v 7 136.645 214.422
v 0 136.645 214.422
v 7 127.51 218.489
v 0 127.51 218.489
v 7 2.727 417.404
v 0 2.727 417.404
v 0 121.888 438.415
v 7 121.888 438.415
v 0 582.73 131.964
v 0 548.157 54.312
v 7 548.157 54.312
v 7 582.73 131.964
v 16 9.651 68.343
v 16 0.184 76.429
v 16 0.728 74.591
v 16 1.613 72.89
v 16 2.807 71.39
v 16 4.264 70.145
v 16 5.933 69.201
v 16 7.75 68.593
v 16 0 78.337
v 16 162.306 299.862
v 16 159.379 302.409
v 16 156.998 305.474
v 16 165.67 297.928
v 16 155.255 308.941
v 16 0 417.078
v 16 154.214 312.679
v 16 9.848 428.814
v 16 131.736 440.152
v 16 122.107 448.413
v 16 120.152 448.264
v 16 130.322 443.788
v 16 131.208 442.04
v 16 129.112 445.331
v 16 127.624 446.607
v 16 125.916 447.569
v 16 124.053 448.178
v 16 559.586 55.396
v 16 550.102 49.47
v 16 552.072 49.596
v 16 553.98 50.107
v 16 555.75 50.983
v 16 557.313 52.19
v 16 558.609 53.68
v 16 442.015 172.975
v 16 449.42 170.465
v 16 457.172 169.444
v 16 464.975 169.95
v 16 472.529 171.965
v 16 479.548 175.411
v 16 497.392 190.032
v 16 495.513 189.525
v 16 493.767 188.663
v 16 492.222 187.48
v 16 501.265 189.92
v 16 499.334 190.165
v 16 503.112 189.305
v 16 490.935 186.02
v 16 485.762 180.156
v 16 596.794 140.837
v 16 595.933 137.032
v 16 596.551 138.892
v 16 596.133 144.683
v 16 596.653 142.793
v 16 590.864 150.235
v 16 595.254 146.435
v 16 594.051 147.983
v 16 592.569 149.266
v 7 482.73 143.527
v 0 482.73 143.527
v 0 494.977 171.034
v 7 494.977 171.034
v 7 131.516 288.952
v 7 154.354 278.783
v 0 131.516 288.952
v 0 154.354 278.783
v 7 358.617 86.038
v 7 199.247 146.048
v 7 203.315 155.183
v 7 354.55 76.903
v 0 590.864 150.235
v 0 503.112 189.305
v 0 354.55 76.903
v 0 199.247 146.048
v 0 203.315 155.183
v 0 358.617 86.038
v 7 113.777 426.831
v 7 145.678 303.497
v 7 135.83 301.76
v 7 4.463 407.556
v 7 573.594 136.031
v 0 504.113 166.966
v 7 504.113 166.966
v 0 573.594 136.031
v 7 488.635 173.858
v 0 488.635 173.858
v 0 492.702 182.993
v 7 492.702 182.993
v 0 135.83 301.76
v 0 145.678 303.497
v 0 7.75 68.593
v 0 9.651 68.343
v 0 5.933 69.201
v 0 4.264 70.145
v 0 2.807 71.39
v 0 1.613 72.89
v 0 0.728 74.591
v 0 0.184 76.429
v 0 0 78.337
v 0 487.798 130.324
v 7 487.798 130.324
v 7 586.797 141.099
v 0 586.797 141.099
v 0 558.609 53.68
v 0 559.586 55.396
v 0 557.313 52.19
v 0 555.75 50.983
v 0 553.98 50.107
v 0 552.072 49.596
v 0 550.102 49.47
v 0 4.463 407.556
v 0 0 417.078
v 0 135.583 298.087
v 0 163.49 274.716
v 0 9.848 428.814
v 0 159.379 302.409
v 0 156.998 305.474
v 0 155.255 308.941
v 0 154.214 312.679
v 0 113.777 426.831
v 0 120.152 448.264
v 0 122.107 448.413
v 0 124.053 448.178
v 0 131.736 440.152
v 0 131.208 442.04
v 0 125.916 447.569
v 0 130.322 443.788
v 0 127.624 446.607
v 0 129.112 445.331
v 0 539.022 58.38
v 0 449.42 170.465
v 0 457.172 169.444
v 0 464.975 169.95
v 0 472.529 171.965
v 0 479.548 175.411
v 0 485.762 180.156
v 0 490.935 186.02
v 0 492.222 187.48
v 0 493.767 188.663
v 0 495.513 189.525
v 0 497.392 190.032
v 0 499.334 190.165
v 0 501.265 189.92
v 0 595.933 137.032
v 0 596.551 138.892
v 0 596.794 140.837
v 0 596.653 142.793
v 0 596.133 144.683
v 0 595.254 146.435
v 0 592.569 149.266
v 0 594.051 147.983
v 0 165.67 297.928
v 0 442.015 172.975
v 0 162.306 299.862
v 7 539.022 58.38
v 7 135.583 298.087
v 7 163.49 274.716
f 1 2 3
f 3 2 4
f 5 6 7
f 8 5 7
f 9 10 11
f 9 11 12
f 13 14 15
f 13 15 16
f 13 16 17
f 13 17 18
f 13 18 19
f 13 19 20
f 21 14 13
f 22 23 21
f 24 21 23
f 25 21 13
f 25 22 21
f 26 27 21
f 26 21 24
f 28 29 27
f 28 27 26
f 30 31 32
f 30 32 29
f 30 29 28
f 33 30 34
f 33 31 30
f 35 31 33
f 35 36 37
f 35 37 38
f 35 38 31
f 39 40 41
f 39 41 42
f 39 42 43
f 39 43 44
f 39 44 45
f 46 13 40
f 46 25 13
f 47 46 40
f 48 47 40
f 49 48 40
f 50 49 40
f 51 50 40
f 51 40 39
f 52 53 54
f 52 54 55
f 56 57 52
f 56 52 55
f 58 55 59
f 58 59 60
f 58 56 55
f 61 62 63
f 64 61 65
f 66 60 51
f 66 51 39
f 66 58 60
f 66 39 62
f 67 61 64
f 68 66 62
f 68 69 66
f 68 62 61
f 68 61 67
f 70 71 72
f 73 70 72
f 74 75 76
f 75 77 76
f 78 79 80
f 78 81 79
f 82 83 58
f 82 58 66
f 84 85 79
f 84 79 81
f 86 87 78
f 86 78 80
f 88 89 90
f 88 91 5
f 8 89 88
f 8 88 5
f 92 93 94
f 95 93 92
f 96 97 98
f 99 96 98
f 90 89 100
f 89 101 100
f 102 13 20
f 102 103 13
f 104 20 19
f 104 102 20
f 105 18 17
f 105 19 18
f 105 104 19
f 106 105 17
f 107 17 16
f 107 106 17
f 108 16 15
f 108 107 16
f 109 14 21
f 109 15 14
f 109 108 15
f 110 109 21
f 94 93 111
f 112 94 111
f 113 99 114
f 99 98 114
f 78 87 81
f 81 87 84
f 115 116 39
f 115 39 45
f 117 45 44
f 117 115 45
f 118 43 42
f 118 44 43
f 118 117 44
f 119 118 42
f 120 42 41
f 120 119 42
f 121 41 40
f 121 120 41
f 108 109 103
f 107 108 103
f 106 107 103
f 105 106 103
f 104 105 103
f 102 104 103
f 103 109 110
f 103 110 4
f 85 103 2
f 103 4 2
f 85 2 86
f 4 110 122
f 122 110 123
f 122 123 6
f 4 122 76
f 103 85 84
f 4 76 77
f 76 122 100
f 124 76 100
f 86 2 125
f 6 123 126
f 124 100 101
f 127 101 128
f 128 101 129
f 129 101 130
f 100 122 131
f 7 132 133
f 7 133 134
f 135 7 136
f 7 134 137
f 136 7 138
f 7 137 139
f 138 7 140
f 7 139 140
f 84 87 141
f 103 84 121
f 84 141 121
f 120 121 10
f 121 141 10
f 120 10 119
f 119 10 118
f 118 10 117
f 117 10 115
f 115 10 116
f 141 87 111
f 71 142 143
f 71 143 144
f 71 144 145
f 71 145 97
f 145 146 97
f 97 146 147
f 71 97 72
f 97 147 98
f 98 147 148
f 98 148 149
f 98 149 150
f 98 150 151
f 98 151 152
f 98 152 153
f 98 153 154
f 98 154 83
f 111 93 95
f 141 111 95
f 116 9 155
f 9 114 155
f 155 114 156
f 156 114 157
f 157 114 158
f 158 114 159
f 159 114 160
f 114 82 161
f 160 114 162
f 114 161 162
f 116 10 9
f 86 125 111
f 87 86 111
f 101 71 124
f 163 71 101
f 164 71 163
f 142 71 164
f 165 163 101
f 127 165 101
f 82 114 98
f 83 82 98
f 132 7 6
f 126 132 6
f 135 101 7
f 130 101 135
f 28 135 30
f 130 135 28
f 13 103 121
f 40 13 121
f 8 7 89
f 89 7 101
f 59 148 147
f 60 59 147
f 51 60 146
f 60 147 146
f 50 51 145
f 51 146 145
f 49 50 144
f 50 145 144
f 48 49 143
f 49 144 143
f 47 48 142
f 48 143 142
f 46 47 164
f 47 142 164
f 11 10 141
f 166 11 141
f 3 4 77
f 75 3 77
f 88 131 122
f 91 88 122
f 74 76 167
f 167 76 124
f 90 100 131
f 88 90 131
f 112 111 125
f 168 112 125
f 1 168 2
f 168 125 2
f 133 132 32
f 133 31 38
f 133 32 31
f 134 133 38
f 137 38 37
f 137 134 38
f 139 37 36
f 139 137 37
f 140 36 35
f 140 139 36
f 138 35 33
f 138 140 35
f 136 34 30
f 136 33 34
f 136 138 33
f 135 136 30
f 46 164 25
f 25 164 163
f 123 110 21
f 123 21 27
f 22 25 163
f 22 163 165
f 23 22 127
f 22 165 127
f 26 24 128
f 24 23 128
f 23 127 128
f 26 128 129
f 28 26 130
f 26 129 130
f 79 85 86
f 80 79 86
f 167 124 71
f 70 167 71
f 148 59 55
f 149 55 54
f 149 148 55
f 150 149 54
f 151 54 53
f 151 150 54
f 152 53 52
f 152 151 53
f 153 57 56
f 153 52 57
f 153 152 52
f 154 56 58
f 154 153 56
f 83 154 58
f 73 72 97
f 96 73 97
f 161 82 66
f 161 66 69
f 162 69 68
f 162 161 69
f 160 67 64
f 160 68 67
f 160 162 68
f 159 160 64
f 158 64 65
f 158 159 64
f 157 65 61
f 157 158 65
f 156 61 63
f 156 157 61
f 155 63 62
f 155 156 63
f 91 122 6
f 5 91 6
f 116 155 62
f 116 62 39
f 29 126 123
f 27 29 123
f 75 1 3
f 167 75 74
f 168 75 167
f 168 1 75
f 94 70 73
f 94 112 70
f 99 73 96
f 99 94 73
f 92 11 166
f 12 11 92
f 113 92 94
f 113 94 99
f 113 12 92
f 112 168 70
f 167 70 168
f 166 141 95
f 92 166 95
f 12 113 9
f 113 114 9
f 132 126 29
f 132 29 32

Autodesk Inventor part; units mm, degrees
ref_plane "YZ Plane" through (0, 0, 0) normal (1, 0, 0) x (0, 1, 0)
ref_plane "XZ Plane" through (0, 0, 0) normal (0, 1, 0) x (-1, 0, 0)
ref_plane "XY Plane" through (0, 0, 0) normal (0, 0, 1) x (1, 0, 0)
sketch "Sketch1" plane through (0, 0, 0) normal (1, 0, 0) x (0, 1, 0)
  line L0 (9.8481, 428.814) -> (120.1519, 448.2635)
  line L1 (131.7365, 440.1519) -> (154.2135, 312.6787)
  line L2 (0, 78.3368) -> (0, 427.0775)
  line L3 (0, 417.0775) -> (0, 78.3368)
  line L4 (503.1119, 189.3047) -> (590.8645, 150.2346)
  line L5 (595.9326, 137.0318) -> (559.5861, 55.3964)
  line L6 (494.9423, 192.942) -> (494.9423, 192.942)
  line L7 (442.0149, 172.9748) -> (165.6696, 297.928)
  arc A0 (442.0149, 172.9748) -> (490.9347, 186.0198) centre (458.495, 209.4221) ccw
  arc A1 (154.2135, 312.6787) -> (165.6696, 297.928) centre (173.9096, 316.1516) ccw
  arc A2 (131.7365, 440.1519) -> (120.1519, 448.2635) centre (121.8884, 438.4154) ccw
  line L8 (9.8481, 428.814) -> (0, 417.0775)
  arc A3 (595.9326, 137.0318) -> (590.8645, 150.2346) centre (586.7972, 141.0991) ccw
  arc A4 (503.1119, 189.3047) -> (490.9347, 186.0198) centre (499.0446, 180.1692) ccw
  line L9 (9.651, 68.3429) -> (550.1017, 49.4699)
  arc A5 (550.1017, 49.4699) -> (559.5861, 55.3964) centre (550.4507, 59.4638) ccw
  arc A6 (0, 78.3368) -> (9.651, 68.3429) centre (10, 78.3368) ccw
  point P0 (0, 0)
  point P1 (0, 0)
  point P2 (130, 450)
  point P3 (156.0472, 302.2788)
  point P4 (0, 0)
  point P5 (534.922, 0)
  point P6 (600, 146.1672)
  point P7 (478.4622, 156.4947)
  point P8 (0, 427.0775)
  point P9 (537.6655, 6.1619)
  point P10 (0, 417.0775)
  dimension "d0" = 130
  dimension "d1" = 404.922
  dimension "d3" = 150
  dimension "d5" = 115
  dimension "d7" = 10
  dimension "d9" = 40
  dimension "d10" = 40
  dimension "d11" = 20
  dimension "d12" = 10
  dimension "d13" = 10
  dimension "d14" = 10
  dimension "d21" = 10
extrude "Extrusion1" add sketch "Sketch1" along normal blind 16
sketch "Sketch2" plane through (0, 0, 0) normal (-1, 0, 0) x (0, 0, 1)
  point P0 (0, 0)
sketch "Sketch3" plane through (0, 0, 0) normal (-1, 0, 0) x (0, 0, 1)
  line L0 (171.0338, 494.9772) -> (173.8576, 488.6347) projected
  line L1 (166.9664, 504.1126) -> (130.324, 487.7983) projected
  line L2 (130.324, 487.7983) -> (274.7158, 163.4898) projected
  line L3 (274.7158, 163.4898) -> (214.4218, 136.6452) projected
  line L4 (214.4218, 136.6452) -> (218.4892, 127.5097) projected
  line L5 (218.4892, 127.5097) -> (278.7831, 154.3544) projected
  line L6 (278.7831, 154.3544) -> (288.9516, 131.5158) projected
  line L7 (288.9516, 131.5158) -> (298.087, 135.5831) projected
  line L8 (298.087, 135.5831) -> (143.5268, 482.7303) projected
  line L9 (143.5268, 482.7303) -> (171.0338, 494.9772) projected
  line L10 (173.8576, 488.6347) -> (182.9931, 492.702) projected
  line L11 (182.9931, 492.702) -> (141.0991, 586.7972) projected
  line L12 (141.0991, 586.7972) -> (131.9637, 582.7298) projected
  line L13 (301.7603, 135.8301) -> (426.8309, 113.7768) projected
  line L14 (426.8309, 113.7768) -> (407.5559, 4.4631) projected
  line L15 (407.5559, 4.4631) -> (417.404, 2.7267) projected
  line L16 (417.404, 2.7267) -> (438.4154, 121.8884) projected
  line L17 (438.4154, 121.8884) -> (303.4968, 145.6782) projected
  line L18 (303.4968, 145.6782) -> (301.7603, 135.8301) projected
  line L19 (428.814, 9.8481) -> (417.0775, 0) projected
  line L20 (417.0775, 0) -> (78.3368, 0) projected
  line L21 (55.3964, 559.5861) -> (137.0318, 595.9326) projected
  arc A0 (150.2346, 590.8645) -> (137.0318, 595.9326) centre (141.0991, 586.7972) ccw projected
  line L22 (150.2346, 590.8645) -> (189.3047, 503.1119) projected
  arc A1 (186.0198, 490.9347) -> (189.3047, 503.1119) centre (180.1692, 499.0446) ccw projected
  arc A2 (186.0198, 490.9347) -> (172.9748, 442.0149) centre (209.4221, 458.495) ccw projected
  line L23 (172.9748, 442.0149) -> (297.928, 165.6696) projected
  arc A3 (297.928, 165.6696) -> (312.6787, 154.2135) centre (316.1516, 173.9096) ccw projected
  line L24 (312.6787, 154.2135) -> (440.1519, 131.7365) projected
  arc A4 (448.2635, 120.1519) -> (440.1519, 131.7365) centre (438.4154, 121.8884) ccw projected
  line L25 (448.2635, 120.1519) -> (428.814, 9.8481) projected
  line L26 (171.0338, 494.9772) -> (173.8576, 488.6347) projected
  line L27 (166.9664, 504.1126) -> (130.324, 487.7983) projected
  line L28 (130.324, 487.7983) -> (274.7158, 163.4898) projected
  line L29 (274.7158, 163.4898) -> (214.4218, 136.6452) projected
  line L30 (214.4218, 136.6452) -> (218.4892, 127.5097) projected
  line L31 (218.4892, 127.5097) -> (278.7831, 154.3544) projected
  line L32 (278.7831, 154.3544) -> (288.9516, 131.5158) projected
  line L33 (288.9516, 131.5158) -> (298.087, 135.5831) projected
  line L34 (298.087, 135.5831) -> (143.5268, 482.7303) projected
  line L35 (143.5268, 482.7303) -> (171.0338, 494.9772) projected
  line L36 (173.8576, 488.6347) -> (182.9931, 492.702) projected
  line L37 (182.9931, 492.702) -> (141.0991, 586.7972) projected
  line L38 (141.0991, 586.7972) -> (131.9637, 582.7298) projected
  line L39 (301.7603, 135.8301) -> (426.8309, 113.7768) projected
  line L40 (426.8309, 113.7768) -> (407.5559, 4.4631) projected
  line L41 (407.5559, 4.4631) -> (417.404, 2.7267) projected
  line L42 (417.404, 2.7267) -> (438.4154, 121.8884) projected
  line L43 (438.4154, 121.8884) -> (303.4968, 145.6782) projected
  line L44 (303.4968, 145.6782) -> (301.7603, 135.8301) projected
  line L45 (428.814, 9.8481) -> (417.0775, 0) projected
  line L46 (417.0775, 0) -> (78.3368, 0) projected
  line L47 (55.3964, 559.5861) -> (137.0318, 595.9326) projected
  arc A5 (150.2346, 590.8645) -> (137.0318, 595.9326) centre (141.0991, 586.7972) ccw projected
  line L48 (150.2346, 590.8645) -> (189.3047, 503.1119) projected
  arc A6 (186.0198, 490.9347) -> (189.3047, 503.1119) centre (180.1692, 499.0446) ccw projected
  arc A7 (186.0198, 490.9347) -> (172.9748, 442.0149) centre (209.4221, 458.495) ccw projected
  line L49 (172.9748, 442.0149) -> (297.928, 165.6696) projected
  arc A8 (297.928, 165.6696) -> (312.6787, 154.2135) centre (316.1516, 173.9096) ccw projected
  line L50 (312.6787, 154.2135) -> (440.1519, 131.7365) projected
  arc A9 (448.2635, 120.1519) -> (440.1519, 131.7365) centre (438.4154, 121.8884) ccw projected
  line L51 (448.2635, 120.1519) -> (428.814, 9.8481) projected
  line L52 (417.404, 2.7267) -> (438.4154, 121.8884) projected
  line L53 (58.3797, 539.0217) -> (136.0311, 573.5943)
  line L54 (54.3124, 548.1571) -> (141.0991, 586.7972)
  line L55 (136.0311, 573.5943) -> (131.9637, 582.7298)
  line L56 (141.0991, 586.7972) -> (182.9931, 492.702)
  line L57 (182.9931, 492.702) -> (173.8576, 488.6347)
  line L58 (166.9664, 504.1126) -> (136.0311, 573.5943)
  line L59 (166.9664, 504.1126) -> (130.324, 487.7983)
  line L60 (130.324, 487.7983) -> (274.7158, 163.4898)
  line L61 (274.7158, 163.4898) -> (214.4218, 136.6452)
  line L62 (214.4218, 136.6452) -> (218.4892, 127.5097)
  line L63 (218.4892, 127.5097) -> (278.7831, 154.3544)
  line L64 (278.7831, 154.3544) -> (288.9516, 131.5158)
  line L65 (288.9516, 131.5158) -> (298.087, 135.5831)
  line L66 (298.087, 135.5831) -> (143.5268, 482.7303)
  line L67 (143.5268, 482.7303) -> (171.0338, 494.9772)
  line L68 (171.0338, 494.9772) -> (173.8576, 488.6347)
  line L69 (303.4968, 145.6782) -> (301.7603, 135.8301)
  line L70 (301.7603, 135.8301) -> (426.8309, 113.7768)
  line L71 (426.8309, 113.7768) -> (407.5559, 4.4631)
  line L72 (407.5559, 4.4631) -> (417.404, 2.7267)
  line L73 (417.404, 2.7267) -> (438.4154, 121.8884)
  line L74 (438.4154, 121.8884) -> (303.4968, 145.6782)
  line L75 (131.9637, 582.7298) -> (54.3123, 548.1572) projected
  line L76 (54.3123, 548.1572) -> (58.3797, 539.0217) projected
  line L77 (58.3797, 539.0217) -> (136.0311, 573.5943) projected
  line L78 (136.0311, 573.5943) -> (166.9664, 504.1126) projected
  line L79 (68.3429, 9.651) -> (49.4699, 550.1017) projected
  arc A10 (55.3964, 559.5861) -> (49.4699, 550.1017) centre (59.4638, 550.4507) ccw projected
  arc A11 (68.3429, 9.651) -> (78.3368, 0) centre (78.3368, 10) ccw projected
  line L80 (131.9637, 582.7298) -> (54.3123, 548.1572) projected
  line L81 (54.3123, 548.1572) -> (58.3797, 539.0217) projected
  line L82 (58.3797, 539.0217) -> (136.0311, 573.5943) projected
  line L83 (136.0311, 573.5943) -> (166.9664, 504.1126) projected
  line L84 (68.3429, 9.651) -> (49.4699, 550.1017) projected
  arc A12 (55.3964, 559.5861) -> (49.4699, 550.1017) centre (59.4638, 550.4507) ccw projected
  arc A13 (68.3429, 9.651) -> (78.3368, 0) centre (78.3368, 10) ccw projected
  line L85 (54.3123, 548.1572) -> (58.3797, 539.0217)
  line L86 (146.0479, 199.2472) -> (155.1834, 203.3146) projected
  line L87 (86.038, 358.6172) -> (76.9026, 354.5499) projected
  line L88 (146.0479, 199.2472) -> (155.1834, 203.3146) projected
  line L89 (86.038, 358.6172) -> (76.9026, 354.5499) projected
  line L90 (86.038, 358.6172) -> (155.1834, 203.3146)
  line L91 (146.0479, 199.2472) -> (155.1834, 203.3146)
  line L92 (146.0479, 199.2472) -> (76.9026, 354.5499)
  line L93 (76.9026, 354.5499) -> (86.038, 358.6172)
  line L94 (76.9026, 354.5499) -> (146.0479, 199.2472) projected
  line L95 (155.1834, 203.3146) -> (86.038, 358.6172) projected
  line L96 (76.9026, 354.5499) -> (146.0479, 199.2472) projected
  line L97 (155.1834, 203.3146) -> (86.038, 358.6172) projected
  point P0 (0, 0)
  point P1 (131.9642, 582.73)
extrude "Extrusion2" cut sketch "Sketch3" against normal blind 7 contours L9 L8 L7 L6 L5 L4 L3 L2 L1 L58 L55 L12 L11 L10 L0 | L55 L53 L76 L54 | L18 L17 L16 L15 L14 L13 | L92 L87 L90 L86
equation "\"d14\" = d13"
properties part number "Arcade_Right"
